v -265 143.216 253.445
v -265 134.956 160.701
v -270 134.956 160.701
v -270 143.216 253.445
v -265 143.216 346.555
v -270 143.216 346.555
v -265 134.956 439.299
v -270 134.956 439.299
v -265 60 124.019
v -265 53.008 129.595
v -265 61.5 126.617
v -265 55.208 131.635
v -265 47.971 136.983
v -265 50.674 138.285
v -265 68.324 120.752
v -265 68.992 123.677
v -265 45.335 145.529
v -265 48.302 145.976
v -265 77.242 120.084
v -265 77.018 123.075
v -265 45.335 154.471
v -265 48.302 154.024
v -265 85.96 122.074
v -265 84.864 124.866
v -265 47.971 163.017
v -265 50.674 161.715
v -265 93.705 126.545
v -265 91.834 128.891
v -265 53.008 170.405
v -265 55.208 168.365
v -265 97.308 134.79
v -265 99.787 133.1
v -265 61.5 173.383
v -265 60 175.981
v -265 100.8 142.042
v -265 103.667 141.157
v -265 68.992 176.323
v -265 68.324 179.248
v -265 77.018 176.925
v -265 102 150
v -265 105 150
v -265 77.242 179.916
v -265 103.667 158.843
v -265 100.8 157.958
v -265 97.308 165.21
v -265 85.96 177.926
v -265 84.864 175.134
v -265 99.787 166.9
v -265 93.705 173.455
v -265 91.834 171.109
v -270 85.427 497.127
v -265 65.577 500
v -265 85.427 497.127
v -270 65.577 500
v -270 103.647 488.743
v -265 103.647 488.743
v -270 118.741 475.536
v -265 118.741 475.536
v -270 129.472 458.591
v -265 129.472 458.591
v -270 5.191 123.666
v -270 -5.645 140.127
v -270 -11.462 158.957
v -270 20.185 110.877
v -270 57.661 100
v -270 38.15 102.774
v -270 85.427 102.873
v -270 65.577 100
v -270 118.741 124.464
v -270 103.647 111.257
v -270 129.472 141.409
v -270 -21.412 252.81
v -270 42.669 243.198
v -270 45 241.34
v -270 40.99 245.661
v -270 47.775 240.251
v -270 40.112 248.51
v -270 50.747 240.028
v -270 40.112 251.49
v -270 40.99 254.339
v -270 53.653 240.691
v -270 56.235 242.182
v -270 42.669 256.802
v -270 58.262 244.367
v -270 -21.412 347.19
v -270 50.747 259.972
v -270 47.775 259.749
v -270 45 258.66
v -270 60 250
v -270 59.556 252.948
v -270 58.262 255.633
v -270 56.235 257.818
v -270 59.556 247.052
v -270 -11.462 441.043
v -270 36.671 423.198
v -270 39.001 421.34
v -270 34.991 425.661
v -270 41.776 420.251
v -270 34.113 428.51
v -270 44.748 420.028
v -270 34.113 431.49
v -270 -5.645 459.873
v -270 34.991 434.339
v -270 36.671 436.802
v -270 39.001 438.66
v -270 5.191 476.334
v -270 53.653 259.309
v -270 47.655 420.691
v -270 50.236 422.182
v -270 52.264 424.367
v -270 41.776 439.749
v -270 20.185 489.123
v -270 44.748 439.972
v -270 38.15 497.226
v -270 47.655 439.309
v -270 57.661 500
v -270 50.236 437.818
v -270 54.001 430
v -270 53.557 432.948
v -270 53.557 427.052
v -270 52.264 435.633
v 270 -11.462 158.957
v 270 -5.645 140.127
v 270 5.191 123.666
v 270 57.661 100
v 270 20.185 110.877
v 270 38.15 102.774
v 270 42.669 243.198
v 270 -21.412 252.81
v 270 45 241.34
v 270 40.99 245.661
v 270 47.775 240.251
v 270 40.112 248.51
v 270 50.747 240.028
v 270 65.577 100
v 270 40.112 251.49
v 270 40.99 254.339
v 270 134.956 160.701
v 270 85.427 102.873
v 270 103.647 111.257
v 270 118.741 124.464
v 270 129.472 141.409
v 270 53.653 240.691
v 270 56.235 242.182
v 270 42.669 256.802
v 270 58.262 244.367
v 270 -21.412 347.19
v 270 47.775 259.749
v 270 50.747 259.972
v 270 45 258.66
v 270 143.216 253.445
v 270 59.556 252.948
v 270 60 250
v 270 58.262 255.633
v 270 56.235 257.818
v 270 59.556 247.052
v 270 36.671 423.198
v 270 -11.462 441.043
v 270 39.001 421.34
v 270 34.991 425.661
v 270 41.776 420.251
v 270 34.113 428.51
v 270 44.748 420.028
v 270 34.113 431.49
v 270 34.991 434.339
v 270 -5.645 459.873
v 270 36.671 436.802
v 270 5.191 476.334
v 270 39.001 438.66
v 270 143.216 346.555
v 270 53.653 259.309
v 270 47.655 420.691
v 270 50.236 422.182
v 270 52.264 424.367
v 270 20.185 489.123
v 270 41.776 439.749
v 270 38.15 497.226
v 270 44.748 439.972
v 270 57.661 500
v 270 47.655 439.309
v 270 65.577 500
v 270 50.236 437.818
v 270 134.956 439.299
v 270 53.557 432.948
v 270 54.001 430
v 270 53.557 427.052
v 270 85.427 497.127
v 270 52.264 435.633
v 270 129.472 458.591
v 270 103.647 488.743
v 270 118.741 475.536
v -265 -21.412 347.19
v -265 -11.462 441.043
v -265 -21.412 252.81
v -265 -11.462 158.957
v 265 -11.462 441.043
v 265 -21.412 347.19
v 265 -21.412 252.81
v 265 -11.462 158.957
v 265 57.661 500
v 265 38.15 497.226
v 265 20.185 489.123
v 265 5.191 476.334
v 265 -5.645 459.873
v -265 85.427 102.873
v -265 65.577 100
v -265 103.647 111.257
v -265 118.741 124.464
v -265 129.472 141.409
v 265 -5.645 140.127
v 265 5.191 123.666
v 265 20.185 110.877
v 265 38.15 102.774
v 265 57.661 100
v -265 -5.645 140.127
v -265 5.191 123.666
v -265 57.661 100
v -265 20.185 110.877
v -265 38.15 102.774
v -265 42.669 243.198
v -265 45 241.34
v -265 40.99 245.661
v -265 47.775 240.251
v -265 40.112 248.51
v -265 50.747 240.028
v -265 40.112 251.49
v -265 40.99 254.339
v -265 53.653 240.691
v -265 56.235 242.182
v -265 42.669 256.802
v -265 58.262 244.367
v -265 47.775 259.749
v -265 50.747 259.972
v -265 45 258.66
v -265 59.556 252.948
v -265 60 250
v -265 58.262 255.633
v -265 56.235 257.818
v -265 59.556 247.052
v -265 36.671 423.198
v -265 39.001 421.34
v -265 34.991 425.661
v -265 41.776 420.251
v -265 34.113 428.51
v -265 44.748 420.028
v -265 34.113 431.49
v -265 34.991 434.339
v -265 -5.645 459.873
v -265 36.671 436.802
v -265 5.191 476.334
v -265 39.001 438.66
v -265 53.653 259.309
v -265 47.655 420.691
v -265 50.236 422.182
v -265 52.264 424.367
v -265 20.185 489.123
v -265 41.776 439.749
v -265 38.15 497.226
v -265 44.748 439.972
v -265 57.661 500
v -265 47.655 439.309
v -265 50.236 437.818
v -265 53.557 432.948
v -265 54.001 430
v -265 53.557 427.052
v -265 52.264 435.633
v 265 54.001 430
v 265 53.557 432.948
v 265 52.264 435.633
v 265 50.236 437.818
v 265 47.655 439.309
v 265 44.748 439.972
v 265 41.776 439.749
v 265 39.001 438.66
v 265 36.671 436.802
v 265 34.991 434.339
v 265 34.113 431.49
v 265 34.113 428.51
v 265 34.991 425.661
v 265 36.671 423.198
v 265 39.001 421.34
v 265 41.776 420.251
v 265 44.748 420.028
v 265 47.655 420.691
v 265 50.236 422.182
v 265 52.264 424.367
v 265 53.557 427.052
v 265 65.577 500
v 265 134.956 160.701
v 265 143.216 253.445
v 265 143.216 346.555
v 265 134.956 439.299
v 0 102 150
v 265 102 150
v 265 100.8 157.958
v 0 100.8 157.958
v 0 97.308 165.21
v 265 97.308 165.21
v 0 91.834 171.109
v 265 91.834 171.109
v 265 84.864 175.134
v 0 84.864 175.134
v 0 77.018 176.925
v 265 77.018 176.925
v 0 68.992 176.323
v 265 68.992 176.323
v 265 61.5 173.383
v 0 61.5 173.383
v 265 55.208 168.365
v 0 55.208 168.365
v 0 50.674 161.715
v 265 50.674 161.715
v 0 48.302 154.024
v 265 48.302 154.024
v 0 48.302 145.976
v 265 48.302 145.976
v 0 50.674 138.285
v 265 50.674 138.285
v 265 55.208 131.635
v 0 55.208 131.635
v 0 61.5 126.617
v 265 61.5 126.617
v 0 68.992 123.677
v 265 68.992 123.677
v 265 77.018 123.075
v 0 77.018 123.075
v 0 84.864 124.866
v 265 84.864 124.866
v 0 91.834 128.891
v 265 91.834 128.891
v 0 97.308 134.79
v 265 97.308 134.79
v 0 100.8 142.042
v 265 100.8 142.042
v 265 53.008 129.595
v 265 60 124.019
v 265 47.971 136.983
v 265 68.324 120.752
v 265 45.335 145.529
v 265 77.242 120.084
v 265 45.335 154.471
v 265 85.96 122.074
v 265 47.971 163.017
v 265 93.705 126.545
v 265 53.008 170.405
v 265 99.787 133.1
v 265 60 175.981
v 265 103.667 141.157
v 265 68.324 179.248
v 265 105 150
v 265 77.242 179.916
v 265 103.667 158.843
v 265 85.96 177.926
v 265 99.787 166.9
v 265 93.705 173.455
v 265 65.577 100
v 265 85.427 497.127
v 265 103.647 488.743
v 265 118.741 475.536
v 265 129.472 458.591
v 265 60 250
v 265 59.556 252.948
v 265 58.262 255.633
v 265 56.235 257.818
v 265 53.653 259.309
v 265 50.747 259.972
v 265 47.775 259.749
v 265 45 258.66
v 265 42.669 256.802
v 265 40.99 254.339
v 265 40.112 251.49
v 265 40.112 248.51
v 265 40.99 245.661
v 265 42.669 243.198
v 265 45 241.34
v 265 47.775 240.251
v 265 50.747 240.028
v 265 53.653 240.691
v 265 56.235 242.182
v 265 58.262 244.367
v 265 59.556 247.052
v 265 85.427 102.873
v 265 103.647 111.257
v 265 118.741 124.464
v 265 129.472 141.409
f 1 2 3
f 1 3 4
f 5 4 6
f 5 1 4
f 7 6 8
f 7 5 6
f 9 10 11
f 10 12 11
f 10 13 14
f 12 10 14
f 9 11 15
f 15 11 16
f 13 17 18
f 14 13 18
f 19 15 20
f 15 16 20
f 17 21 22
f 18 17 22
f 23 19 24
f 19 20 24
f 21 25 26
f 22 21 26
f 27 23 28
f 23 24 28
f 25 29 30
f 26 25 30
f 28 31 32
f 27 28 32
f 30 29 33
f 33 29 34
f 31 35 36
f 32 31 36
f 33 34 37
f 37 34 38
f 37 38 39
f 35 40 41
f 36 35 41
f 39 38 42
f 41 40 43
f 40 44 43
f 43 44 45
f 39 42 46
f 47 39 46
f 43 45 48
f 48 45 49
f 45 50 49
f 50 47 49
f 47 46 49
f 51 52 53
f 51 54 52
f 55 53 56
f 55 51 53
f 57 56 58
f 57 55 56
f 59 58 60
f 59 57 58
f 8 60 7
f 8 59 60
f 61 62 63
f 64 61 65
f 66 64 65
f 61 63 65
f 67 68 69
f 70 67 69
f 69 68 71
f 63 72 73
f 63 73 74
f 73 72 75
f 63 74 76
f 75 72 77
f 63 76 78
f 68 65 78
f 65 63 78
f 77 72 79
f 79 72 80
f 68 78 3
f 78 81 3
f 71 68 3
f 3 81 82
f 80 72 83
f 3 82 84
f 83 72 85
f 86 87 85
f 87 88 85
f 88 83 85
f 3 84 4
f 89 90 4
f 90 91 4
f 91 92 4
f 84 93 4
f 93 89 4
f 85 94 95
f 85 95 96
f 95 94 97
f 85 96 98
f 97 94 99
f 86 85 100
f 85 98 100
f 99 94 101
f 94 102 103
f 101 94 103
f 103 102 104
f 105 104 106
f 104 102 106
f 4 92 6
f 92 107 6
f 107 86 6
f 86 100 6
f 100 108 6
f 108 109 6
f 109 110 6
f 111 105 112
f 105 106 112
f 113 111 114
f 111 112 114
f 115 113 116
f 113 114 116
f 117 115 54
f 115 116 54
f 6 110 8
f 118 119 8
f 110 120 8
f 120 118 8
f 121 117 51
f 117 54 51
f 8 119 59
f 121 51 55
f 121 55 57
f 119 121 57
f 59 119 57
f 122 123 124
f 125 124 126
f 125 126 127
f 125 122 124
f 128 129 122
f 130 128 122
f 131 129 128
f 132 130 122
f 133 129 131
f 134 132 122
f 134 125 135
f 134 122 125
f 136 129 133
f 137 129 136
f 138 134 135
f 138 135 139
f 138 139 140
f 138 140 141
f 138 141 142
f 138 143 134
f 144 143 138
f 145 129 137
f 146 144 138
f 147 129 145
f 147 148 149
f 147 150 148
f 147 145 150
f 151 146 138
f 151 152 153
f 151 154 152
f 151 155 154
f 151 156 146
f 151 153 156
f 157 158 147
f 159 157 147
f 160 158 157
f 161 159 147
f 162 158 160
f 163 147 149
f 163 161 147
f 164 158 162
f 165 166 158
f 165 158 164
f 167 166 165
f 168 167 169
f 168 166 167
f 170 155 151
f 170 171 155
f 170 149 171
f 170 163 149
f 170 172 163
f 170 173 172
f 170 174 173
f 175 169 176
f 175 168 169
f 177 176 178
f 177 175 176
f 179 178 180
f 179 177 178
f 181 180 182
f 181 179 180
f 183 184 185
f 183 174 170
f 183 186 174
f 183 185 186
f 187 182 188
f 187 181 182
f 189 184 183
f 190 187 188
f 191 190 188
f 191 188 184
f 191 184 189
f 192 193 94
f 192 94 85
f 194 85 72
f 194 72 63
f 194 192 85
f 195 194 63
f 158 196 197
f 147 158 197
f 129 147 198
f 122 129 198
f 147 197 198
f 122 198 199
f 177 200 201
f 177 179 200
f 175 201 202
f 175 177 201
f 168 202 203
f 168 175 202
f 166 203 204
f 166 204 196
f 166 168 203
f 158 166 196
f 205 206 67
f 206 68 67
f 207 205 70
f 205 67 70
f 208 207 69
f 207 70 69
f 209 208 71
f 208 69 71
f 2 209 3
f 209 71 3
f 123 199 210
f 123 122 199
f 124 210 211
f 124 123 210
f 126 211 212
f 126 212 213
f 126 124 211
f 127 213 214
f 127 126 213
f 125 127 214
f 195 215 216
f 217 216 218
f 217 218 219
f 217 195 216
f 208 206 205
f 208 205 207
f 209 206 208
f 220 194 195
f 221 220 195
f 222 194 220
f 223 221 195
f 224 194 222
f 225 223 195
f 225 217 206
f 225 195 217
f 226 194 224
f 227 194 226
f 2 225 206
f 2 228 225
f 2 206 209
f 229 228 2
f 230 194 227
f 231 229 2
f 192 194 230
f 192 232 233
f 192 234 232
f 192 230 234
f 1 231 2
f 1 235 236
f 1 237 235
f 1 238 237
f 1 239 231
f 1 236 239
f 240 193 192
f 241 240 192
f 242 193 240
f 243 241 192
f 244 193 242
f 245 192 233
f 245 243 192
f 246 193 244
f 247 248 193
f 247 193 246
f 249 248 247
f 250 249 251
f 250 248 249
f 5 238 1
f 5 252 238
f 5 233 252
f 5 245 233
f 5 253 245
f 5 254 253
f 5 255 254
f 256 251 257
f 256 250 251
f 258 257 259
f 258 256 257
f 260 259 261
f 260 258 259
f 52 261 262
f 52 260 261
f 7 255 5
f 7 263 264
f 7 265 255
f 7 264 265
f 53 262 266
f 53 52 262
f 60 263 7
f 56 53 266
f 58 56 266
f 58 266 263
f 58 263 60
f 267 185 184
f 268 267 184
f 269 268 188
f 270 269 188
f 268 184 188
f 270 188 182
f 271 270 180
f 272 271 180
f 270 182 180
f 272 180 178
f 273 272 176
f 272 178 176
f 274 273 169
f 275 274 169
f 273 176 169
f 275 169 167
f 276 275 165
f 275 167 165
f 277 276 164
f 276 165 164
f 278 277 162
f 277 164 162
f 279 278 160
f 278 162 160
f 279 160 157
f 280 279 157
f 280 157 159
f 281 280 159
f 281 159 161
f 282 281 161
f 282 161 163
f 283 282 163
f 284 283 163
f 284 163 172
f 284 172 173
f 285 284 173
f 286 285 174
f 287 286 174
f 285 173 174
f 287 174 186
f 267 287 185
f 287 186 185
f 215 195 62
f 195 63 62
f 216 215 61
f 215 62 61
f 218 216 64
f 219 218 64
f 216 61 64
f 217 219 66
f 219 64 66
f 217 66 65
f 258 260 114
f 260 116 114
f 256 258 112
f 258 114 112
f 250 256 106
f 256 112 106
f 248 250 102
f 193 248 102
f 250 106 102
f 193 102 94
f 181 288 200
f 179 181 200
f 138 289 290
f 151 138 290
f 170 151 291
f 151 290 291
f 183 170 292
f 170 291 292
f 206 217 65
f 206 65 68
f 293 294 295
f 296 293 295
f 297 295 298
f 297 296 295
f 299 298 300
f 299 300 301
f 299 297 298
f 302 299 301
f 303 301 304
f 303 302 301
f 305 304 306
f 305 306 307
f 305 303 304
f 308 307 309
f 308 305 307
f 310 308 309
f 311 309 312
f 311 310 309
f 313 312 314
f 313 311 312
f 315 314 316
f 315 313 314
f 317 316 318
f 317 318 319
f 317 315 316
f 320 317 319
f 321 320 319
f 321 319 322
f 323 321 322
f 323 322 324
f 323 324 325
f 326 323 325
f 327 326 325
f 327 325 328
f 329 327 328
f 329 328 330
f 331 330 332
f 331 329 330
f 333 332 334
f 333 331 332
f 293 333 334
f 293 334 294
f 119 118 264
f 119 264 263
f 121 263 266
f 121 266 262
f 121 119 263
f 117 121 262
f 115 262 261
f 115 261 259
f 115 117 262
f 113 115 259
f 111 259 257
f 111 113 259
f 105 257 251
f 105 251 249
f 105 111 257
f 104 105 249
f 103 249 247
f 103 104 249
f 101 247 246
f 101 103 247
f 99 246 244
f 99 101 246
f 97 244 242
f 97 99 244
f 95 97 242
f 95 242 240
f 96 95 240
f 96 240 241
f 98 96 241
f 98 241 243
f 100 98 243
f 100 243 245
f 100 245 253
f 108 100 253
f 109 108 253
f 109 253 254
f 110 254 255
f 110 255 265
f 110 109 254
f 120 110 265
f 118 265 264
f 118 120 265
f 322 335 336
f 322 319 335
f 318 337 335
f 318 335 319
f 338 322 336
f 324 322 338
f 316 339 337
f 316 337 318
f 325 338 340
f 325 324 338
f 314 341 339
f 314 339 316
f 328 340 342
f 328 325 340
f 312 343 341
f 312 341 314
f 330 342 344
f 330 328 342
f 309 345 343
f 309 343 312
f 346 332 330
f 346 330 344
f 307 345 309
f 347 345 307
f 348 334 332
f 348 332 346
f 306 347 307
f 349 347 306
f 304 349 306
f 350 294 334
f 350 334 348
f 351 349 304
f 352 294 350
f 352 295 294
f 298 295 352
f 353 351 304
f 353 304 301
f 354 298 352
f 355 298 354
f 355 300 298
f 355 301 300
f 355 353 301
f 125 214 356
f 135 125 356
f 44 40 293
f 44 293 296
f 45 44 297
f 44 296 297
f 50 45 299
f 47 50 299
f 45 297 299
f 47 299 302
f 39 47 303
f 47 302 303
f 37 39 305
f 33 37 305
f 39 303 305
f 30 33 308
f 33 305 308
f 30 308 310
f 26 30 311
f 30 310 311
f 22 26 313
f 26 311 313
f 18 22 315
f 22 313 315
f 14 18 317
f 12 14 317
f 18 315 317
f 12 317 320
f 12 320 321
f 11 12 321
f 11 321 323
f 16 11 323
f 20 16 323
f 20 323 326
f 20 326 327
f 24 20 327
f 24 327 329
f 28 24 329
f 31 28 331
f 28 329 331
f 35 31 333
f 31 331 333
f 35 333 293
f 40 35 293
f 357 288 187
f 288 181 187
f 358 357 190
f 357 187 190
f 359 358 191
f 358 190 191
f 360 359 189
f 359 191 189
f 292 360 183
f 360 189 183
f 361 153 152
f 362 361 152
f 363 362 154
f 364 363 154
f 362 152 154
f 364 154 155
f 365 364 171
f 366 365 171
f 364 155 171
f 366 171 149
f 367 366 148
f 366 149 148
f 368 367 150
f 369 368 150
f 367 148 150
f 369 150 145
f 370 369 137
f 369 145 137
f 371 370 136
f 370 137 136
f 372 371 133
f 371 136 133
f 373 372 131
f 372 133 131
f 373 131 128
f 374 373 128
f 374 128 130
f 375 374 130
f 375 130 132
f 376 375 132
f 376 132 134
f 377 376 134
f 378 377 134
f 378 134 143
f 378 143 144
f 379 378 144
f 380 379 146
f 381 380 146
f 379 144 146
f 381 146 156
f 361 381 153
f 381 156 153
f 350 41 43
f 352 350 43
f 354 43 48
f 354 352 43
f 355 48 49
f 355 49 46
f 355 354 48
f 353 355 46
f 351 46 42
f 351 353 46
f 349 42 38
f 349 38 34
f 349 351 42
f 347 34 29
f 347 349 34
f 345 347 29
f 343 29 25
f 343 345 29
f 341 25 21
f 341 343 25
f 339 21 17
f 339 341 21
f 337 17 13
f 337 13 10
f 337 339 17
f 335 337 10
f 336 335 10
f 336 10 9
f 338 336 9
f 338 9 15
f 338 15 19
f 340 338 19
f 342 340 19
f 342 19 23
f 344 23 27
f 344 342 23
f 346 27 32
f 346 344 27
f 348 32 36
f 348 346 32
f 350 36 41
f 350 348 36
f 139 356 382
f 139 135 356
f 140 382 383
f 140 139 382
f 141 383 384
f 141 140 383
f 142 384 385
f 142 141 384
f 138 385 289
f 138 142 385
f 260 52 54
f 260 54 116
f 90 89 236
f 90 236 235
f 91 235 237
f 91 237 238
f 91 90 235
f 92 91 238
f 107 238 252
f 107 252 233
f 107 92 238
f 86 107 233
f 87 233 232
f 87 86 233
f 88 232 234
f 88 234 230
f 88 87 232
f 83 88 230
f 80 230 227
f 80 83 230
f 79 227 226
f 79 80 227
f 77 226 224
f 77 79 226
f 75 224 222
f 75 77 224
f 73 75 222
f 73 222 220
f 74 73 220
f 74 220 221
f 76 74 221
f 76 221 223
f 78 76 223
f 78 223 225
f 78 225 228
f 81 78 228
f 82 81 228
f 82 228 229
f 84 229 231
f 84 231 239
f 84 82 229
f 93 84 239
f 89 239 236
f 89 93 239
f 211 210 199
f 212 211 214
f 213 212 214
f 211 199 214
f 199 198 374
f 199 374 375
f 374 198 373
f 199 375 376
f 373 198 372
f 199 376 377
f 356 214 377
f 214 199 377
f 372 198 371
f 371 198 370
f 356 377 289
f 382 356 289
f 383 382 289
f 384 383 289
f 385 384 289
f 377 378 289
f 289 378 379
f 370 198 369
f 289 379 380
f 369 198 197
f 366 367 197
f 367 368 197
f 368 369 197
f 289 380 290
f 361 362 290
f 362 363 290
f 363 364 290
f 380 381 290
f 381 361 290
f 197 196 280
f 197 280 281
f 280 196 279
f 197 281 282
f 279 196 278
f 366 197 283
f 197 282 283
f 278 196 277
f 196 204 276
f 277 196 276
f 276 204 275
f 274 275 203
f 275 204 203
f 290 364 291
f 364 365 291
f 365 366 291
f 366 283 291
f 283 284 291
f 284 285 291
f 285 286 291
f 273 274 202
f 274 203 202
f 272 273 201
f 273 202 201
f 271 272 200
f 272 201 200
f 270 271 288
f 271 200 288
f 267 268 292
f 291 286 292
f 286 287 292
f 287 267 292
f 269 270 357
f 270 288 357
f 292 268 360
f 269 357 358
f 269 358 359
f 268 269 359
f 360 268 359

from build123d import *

# Parameters (mm, degrees)
F3_DEPTH      = 5
F4_R          = 70
F5_R          = 10
F6_DEPTH      = 5
F0_R          = 30
F0_R_2        = 27
F8_DEPTH      = 265
F8_DEPTH_BACK = 265


with BuildPart() as f3:
    # F2 (on offset) → F3 (new body)
    with BuildSketch(Plane.YZ.offset(265)):
        with BuildLine():
            Line((125, 500), (0, 500))
            ThreePointArc((0, 500), (-22.6578684459, 300), (0, 100))
            Line((0, 100), (125, 100))
            ThreePointArc((125, 100), (144.2504457375, 300), (125, 500))
        make_face()
    extrude(amount=F3_DEPTH)

    # F4
    f4_edges = [f3.edges().sort_by_distance(p)[0] for p in [
        (267.5, 0, 500),
        (267.5, 125, 500),
        (267.5, 0, 100),
        (267.5, 125, 100),
    ]]
    fillet(f4_edges, radius=F4_R)

    # F5 (on face) → F6 (cut, through all)
    with BuildSketch(Plane.YZ.offset(270)):
        with Locations((44.0011583269, 430)):
            Circle(F5_R)
        with Locations((50, 250)):
            Circle(F5_R)
    extrude(amount=-F6_DEPTH, mode=Mode.SUBTRACT)


with BuildPart() as f7_1:
    # F7: instance of F3
    add(f3.part.mirror(Plane.YZ))


with BuildPart() as f8:
    # F0 (on Right) → F8 (new body, two sides)
    with BuildSketch(Plane.YZ) as f8_sk:
        with Locations((75, 150)):
            Circle(F0_R)
        with Locations((75, 150)):
            Circle(F0_R_2, mode=Mode.SUBTRACT)
    extrude(amount=F8_DEPTH)
    extrude(f8_sk.sketch, amount=-F8_DEPTH_BACK)


solid = Compound([f3.part, f7_1.part, f8.part])
